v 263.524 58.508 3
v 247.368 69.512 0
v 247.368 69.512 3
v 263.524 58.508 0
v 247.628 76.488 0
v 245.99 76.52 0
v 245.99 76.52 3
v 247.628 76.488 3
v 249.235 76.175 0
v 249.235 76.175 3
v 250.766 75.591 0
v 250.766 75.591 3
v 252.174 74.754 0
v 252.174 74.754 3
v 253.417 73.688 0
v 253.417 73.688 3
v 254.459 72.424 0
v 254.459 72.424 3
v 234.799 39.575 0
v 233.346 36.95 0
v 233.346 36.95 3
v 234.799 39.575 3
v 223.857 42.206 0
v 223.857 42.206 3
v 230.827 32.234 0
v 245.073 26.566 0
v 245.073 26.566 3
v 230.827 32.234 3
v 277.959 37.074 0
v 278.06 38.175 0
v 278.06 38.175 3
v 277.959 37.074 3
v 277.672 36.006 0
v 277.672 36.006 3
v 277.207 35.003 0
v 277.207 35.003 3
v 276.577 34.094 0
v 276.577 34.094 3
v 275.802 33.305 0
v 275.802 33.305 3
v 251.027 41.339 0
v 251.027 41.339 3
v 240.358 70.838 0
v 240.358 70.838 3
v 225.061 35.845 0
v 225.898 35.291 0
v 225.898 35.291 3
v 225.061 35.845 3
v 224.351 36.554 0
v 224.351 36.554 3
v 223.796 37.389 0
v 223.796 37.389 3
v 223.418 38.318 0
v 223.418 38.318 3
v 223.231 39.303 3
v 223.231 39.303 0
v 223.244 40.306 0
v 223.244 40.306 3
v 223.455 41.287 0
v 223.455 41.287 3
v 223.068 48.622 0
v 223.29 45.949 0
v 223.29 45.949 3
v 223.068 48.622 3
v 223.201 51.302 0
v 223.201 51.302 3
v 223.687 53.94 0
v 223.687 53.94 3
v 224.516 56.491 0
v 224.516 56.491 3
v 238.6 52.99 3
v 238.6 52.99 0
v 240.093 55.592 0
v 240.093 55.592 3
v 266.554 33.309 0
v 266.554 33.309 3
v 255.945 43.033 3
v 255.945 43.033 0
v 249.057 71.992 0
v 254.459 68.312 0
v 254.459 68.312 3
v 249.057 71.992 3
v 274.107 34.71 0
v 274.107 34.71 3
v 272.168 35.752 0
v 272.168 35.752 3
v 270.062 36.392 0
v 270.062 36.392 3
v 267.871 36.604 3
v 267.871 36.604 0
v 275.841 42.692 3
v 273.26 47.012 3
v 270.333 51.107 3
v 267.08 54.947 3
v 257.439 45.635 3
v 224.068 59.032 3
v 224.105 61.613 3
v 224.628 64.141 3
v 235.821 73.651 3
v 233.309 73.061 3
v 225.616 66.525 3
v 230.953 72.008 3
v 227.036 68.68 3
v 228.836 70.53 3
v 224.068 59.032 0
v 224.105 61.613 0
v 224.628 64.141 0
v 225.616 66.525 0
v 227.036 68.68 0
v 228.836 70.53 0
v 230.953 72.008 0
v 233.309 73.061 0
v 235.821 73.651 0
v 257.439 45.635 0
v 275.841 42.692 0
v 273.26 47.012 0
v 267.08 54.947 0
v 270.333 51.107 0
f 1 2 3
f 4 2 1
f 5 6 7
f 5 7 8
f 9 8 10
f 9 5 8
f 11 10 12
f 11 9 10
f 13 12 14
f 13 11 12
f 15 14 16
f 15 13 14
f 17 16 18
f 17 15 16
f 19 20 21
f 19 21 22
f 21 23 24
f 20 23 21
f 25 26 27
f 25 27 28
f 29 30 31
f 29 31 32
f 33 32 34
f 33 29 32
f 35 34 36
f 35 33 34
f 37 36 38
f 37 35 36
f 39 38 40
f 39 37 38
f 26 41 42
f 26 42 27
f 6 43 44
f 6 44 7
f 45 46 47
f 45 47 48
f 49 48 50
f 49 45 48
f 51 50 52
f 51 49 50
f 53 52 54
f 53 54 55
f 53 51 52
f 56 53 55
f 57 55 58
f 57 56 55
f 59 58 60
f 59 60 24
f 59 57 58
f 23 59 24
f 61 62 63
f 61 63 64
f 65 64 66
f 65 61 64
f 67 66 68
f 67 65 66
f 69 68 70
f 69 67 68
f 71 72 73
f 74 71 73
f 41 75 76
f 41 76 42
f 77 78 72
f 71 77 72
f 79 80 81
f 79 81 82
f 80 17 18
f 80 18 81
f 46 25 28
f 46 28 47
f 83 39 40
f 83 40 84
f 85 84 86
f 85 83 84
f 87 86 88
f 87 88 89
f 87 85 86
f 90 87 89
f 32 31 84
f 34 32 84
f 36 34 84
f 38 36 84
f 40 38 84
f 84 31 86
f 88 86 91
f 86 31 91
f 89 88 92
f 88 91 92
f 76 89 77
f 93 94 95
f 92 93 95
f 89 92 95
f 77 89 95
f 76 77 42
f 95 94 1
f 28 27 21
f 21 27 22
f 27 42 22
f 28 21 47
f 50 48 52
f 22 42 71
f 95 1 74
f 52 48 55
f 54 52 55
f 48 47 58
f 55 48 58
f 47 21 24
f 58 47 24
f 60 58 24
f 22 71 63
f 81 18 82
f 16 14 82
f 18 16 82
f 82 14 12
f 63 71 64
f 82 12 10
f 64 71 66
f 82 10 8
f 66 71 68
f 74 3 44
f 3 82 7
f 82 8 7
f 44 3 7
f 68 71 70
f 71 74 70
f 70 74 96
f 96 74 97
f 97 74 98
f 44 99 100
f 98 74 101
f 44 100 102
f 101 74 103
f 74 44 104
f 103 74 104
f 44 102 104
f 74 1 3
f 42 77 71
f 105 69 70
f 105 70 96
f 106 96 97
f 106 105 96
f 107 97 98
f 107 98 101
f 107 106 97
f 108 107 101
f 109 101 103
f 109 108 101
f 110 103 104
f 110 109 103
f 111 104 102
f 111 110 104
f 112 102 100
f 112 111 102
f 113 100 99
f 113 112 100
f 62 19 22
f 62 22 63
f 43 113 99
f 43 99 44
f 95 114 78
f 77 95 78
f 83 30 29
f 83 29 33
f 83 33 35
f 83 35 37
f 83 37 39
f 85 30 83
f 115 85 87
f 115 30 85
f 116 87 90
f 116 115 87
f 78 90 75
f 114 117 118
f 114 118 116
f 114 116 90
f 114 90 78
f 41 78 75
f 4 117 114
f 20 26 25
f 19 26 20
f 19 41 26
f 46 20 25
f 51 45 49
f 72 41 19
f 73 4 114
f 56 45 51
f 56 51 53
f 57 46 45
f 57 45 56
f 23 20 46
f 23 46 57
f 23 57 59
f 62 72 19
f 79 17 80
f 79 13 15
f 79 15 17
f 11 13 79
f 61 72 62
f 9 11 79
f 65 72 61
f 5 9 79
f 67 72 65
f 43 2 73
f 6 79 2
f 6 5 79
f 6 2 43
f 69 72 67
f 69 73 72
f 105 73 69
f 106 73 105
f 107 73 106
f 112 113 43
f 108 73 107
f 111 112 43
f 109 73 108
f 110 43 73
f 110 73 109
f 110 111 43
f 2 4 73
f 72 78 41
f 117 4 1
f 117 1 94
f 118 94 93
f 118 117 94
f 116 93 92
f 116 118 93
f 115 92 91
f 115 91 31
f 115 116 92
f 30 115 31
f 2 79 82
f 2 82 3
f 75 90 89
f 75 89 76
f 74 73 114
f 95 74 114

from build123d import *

# Parameters (mm, degrees)
BASE_EXTRUDE_DEPTH = 3


with BuildPart() as part:
    # Sketch1 → Base-Extrude (new body)
    with BuildSketch(Plane.XY):
        with BuildLine():
            Line((254.458999609, 72.42410604), (254.458999609, 68.312175266))
            Line((254.458999609, 68.312175266), (249.057113985, 71.99161005))
            Line((249.057113985, 71.99161005), (247.368253343, 69.512144436))
            Line((247.368253343, 69.512144436), (263.523901664, 58.507902857))
            ThreePointArc((263.523901664, 58.507902857), (271.838397848, 49.089575752), (278.059793662, 38.174908264))
            ThreePointArc((278.059793662, 38.174908264), (277.460971595, 35.494168544), (275.801504518, 33.305305293))
            ThreePointArc((275.801504518, 33.305305293), (272.168235705, 35.752461976), (267.87122217, 36.603868337))
            Line((267.87122217, 36.603868337), (266.553980851, 33.3090367))
            Line((266.553980851, 33.3090367), (251.02719612, 41.33883075))
            Line((251.02719612, 41.33883075), (245.072593427, 26.565797378))
            Line((245.072593427, 26.565797378), (230.827204858, 32.233531984))
            Line((230.827204858, 32.233531984), (225.897587097, 35.291364614))
            ThreePointArc((225.897587097, 35.291364614), (223.417826754, 38.317877983), (223.856638727, 42.205864427))
            Line((223.856638727, 42.205864427), (233.34569838, 36.950163447))
            Line((233.34569838, 36.950163447), (234.799244804, 39.574511517))
            Line((234.799244804, 39.574511517), (223.290021138, 45.949119784))
            ThreePointArc((223.290021138, 45.949119784), (223.201365162, 51.301598344), (224.516481401, 56.490755877))
            ThreePointArc((224.516481401, 56.490755877), (226.27528444, 67.636113231), (235.821369896, 73.651479483))
            Line((235.821369896, 73.651479483), (240.358475054, 70.837802847))
            Line((240.358475054, 70.837802847), (245.989993101, 76.519880328))
            ThreePointArc((245.989993101, 76.519880328), (250.765877804, 75.591430608), (254.458999609, 72.42410604))
        make_face()
        Polygon((240.093331419, 55.591825093), (257.438617194, 45.634864644), (255.945073126, 43.033071777), (238.599787351, 52.990032226), align=None, mode=Mode.SUBTRACT)
    extrude(amount=BASE_EXTRUDE_DEPTH)


solid = part.part
